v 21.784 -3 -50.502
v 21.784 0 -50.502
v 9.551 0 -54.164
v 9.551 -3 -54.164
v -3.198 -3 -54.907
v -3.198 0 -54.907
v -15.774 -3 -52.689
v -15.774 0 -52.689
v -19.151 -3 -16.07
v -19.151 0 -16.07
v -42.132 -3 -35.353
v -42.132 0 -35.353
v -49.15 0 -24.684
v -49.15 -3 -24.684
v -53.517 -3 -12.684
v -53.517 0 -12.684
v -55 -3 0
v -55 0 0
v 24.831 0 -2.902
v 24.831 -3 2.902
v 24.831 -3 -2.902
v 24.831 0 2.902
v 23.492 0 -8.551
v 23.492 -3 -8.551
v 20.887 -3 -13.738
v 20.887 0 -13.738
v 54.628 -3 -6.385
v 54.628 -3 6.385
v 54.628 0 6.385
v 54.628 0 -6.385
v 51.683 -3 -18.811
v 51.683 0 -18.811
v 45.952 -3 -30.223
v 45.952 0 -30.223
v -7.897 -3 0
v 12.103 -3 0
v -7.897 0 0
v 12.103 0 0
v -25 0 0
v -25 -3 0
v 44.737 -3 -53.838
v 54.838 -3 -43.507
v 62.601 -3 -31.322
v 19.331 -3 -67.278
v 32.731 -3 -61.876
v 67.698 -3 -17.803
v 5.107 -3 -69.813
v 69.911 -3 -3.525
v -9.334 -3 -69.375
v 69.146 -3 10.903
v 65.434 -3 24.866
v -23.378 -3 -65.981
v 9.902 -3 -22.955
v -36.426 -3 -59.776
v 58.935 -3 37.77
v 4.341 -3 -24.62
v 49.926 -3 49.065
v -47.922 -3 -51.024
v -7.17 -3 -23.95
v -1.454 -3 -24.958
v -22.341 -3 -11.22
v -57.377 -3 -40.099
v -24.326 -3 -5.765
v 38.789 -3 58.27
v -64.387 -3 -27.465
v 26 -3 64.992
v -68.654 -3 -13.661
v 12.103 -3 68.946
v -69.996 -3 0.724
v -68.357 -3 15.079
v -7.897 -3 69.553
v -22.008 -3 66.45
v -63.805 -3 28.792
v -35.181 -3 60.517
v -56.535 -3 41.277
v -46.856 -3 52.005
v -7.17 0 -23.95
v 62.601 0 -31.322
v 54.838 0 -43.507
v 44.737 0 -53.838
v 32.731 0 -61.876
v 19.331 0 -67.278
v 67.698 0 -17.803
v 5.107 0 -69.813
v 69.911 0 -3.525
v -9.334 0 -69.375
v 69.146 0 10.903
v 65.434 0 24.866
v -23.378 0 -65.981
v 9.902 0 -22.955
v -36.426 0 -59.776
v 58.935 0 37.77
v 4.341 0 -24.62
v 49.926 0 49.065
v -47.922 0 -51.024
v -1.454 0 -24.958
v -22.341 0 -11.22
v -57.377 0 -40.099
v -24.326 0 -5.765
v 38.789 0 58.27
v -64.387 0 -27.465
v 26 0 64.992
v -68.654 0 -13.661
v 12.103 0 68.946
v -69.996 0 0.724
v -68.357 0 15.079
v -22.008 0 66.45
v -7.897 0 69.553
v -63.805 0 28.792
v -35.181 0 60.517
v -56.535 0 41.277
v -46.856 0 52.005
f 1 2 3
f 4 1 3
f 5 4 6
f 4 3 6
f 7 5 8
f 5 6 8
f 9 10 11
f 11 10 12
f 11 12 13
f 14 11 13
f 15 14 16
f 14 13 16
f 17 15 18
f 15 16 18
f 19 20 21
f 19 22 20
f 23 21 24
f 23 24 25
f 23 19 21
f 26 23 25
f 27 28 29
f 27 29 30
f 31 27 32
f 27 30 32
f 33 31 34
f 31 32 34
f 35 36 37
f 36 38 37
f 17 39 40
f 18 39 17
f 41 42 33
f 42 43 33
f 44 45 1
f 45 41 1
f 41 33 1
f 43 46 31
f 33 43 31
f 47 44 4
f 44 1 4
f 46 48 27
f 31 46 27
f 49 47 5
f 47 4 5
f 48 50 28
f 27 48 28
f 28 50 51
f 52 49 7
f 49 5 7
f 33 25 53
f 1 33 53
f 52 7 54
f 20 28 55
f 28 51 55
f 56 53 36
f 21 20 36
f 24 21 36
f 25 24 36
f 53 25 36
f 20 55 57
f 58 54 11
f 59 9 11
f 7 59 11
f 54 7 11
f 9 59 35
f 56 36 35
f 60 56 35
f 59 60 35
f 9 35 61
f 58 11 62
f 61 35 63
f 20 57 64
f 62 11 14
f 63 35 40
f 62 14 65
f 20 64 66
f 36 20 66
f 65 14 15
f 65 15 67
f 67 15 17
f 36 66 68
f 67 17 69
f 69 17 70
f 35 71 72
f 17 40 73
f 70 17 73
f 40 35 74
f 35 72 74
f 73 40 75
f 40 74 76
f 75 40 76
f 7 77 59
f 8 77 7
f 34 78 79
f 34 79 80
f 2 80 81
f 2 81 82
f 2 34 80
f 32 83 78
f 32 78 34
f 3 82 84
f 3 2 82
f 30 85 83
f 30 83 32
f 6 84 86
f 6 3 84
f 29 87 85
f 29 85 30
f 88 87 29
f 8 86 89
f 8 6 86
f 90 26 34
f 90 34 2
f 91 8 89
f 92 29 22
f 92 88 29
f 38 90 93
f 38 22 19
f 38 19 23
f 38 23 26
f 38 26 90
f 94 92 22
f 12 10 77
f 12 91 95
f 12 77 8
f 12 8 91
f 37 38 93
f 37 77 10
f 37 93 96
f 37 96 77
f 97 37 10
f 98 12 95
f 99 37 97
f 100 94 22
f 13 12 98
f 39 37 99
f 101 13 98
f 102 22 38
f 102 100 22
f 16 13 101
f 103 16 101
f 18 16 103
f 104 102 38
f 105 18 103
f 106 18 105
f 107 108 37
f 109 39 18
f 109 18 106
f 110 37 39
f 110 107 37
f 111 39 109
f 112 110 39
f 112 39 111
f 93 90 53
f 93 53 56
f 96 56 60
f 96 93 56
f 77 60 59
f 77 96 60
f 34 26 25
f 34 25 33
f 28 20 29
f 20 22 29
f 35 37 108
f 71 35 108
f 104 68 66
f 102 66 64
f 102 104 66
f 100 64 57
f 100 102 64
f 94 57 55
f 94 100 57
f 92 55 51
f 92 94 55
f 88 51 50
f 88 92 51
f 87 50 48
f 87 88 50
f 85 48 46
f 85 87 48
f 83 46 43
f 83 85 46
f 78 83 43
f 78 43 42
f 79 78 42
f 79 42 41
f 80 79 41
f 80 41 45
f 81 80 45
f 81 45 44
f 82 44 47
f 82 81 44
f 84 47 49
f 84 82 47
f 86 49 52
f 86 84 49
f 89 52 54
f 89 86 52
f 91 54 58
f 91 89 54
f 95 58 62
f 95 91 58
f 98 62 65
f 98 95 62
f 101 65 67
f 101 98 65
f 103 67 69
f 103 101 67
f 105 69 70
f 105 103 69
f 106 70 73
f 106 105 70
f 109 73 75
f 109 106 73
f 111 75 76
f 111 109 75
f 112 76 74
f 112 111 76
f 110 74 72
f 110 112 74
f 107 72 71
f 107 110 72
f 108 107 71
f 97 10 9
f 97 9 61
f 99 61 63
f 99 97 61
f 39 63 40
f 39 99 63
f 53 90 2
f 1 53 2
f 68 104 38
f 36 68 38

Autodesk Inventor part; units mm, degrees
ref_plane "YZ Plane" through (0, 0, 0) normal (1, 0, 0) x (0, 1, 0)
ref_plane "XZ Plane" through (0, 0, 0) normal (0, 1, 0) x (-1, 0, 0)
ref_plane "XY Plane" through (0, 0, 0) normal (0, 0, 1) x (1, 0, 0)
sketch "草圖3" plane through (0, 0, 0) normal (0, 1, 0) x (-1, 0, 0)
  circle A0 centre (0, 0) radius 25
  circle A1 centre (0, 0) radius 70
  line L0 (5, 5) -> (61, 5)
  line L1 (61, 5) -> (61, 32.4)
  line L2 (61, 32.4) -> (5, 32.4)
  line L3 (5, 32.4) -> (5, 5)
  line L4 (19, 33.9) -> (12, 33.9)
  line L5 (12, 33.9) -> (12, 30.9)
  line L6 (12, 30.9) -> (19, 30.9)
  line L7 (19, 30.9) -> (19, 33.9)
  line L8 (54, 33.9) -> (47, 33.9)
  line L9 (47, 33.9) -> (47, 30.9)
  line L10 (47, 30.9) -> (54, 30.9)
  line L11 (54, 30.9) -> (54, 33.9)
  line L12 (61, 18.7) -> (5, 18.7)
  line L13 (19, 3.5) -> (12, 3.5)
  line L14 (12, 3.5) -> (12, 6.5)
  line L15 (12, 6.5) -> (19, 6.5)
  line L16 (19, 6.5) -> (19, 3.5)
  line L17 (54, 3.5) -> (47, 3.5)
  line L18 (47, 3.5) -> (47, 6.5)
  line L19 (47, 6.5) -> (54, 6.5)
  line L20 (54, 6.5) -> (54, 3.5)
  line L21 (0, 0) -> (55, 0)
  line L22 (19.1511, -16.0697) -> (42.1324, -35.3533)
  arc A2 (42.1324, -35.3533) -> (55, 0) centre (0, 0) ccw
  line L23 (0, 0) -> (15.7742, -52.6894)
  arc A3 (-21.7844, -50.5019) -> (15.7742, -52.6894) centre (0, 0) ccw
  line L24 (-9.902, -22.9554) -> (-21.7844, -50.5019)
  line L25 (0, 0) -> (-45.9518, -30.223)
  arc A4 (-54.6281, 6.3851) -> (-45.9518, -30.223) centre (0, 0) ccw
  line L26 (-24.831, 2.9023) -> (-54.6281, 6.3851)
  line L27 (0, 0) -> (-42.1324, 35.3533)
  arc A5 (-9.5506, 54.1644) -> (-42.1324, 35.3533) centre (0, 0) ccw
  line L28 (-4.3412, 24.6202) -> (-9.5506, 54.1644)
  line L29 (17.5, 0) -> (-21.7065, 0)
  line L30 (7.8968, 70) -> (-12.1032, 70)
  line L31 (-12.1032, 70) -> (-12.1032, 0)
  line L32 (-12.1032, 0) -> (7.8968, 0)
  line L33 (7.8968, 0) -> (7.8968, 70)
  point P0 (25, 0)
  point P1 (12, 32.4)
  point P2 (47, 32.4)
  point P3 (12, 5)
  point P4 (47, 5)
  point P5 (0, -70)
  point P6 (-20.8872, -13.7377)
  point P7 (-19.1511, 16.0697)
  point P8 (-4.3412, 24.6202)
  point P9 (25, 0)
  point P10 (-2.1032, 0)
  point P11 (7.1701, -23.9497)
  point P12 (-9.902, -22.9554)
  point P13 (-12.1032, 21.8749)
  point P14 (-12.1032, 33.2534)
  point P15 (-12.1032, 68.9457)
  point P16 (7.8968, 69.5532)
  point P17 (7.8968, 23.7201)
  point P18 (-12.1032, 53.6518)
  point P19 (0, 70)
  point P20 (-12.1032, 10.1558)
  dimension "d19" = 140
  dimension "d30" = 56
  dimension "d31" = 27.4
  dimension "d32" = 5
  dimension "d34" = 3
  dimension "d35" = 7
  dimension "d36" = 3
  dimension "d37" = 7
  dimension "d38" = 7
  dimension "d39" = 7
  dimension "d48" = 50
  dimension "d54" = 36
  dimension "d55" = 55
  dimension "d56" = 40
  dimension "d57" = 0
  dimension "d60" = 220
  dimension "d62" = 20
  dimension "d63" = 70
  dimension "d64" = 53.1032
  dimension "d65" = 30.9
  dimension "d66" = 36
  dimension "d67" = 30.9
  dimension "d68" = 43.5
  dimension "d69" = 61
  dimension "d70" = 30.9
  dimension "d71" = 61
  dimension "d72" = 30.9
  dimension "d73" = 100.9
  dimension "d74" = 69.5505
  dimension "d75" = 7.4077
  dimension "d76" = 80.1511
  dimension "d77" = 46.9697
  dimension "d78" = 82.6506
  dimension "d79" = 18.4
  dimension "d80" = 86
  dimension "d81" = 30.9
extrude "擠出2" add sketch "草圖3" against normal blind 3 contours A0 L23 L21 | L22 A2 L21 A0 L0 L18 L17 L20 L1 L2 L11 L8 L9 L7 L4 L5 L33 A1 L31 A5 L27 L26 A4 L25 L24 A3 L23 | L21 L33 L0 L14 L13 L16 A0 | A0 L25 L23 | L0 L16 L15 L14 L33 L12 A0 | A0 L12 L1 L0 L20 L19 L18 | L25 A0 L27 L31 L29 | L12 L33 A0 | A0 L33 L2 L5 L6 L7 L9 L10 L11 L1 L12 | L16 L13 L14 L0 | L0 L14 L15 L16 | L18 L19 L20 L0 | L0 L20 L17 L18 | L27 A0 L31 | L27 A5 L31 A0 | L5 L4 L7 L2 | L2 L7 L6 L5 | L11 L10 L9 L2 | L2 L9 L8 L11
properties part number "轉盤"
